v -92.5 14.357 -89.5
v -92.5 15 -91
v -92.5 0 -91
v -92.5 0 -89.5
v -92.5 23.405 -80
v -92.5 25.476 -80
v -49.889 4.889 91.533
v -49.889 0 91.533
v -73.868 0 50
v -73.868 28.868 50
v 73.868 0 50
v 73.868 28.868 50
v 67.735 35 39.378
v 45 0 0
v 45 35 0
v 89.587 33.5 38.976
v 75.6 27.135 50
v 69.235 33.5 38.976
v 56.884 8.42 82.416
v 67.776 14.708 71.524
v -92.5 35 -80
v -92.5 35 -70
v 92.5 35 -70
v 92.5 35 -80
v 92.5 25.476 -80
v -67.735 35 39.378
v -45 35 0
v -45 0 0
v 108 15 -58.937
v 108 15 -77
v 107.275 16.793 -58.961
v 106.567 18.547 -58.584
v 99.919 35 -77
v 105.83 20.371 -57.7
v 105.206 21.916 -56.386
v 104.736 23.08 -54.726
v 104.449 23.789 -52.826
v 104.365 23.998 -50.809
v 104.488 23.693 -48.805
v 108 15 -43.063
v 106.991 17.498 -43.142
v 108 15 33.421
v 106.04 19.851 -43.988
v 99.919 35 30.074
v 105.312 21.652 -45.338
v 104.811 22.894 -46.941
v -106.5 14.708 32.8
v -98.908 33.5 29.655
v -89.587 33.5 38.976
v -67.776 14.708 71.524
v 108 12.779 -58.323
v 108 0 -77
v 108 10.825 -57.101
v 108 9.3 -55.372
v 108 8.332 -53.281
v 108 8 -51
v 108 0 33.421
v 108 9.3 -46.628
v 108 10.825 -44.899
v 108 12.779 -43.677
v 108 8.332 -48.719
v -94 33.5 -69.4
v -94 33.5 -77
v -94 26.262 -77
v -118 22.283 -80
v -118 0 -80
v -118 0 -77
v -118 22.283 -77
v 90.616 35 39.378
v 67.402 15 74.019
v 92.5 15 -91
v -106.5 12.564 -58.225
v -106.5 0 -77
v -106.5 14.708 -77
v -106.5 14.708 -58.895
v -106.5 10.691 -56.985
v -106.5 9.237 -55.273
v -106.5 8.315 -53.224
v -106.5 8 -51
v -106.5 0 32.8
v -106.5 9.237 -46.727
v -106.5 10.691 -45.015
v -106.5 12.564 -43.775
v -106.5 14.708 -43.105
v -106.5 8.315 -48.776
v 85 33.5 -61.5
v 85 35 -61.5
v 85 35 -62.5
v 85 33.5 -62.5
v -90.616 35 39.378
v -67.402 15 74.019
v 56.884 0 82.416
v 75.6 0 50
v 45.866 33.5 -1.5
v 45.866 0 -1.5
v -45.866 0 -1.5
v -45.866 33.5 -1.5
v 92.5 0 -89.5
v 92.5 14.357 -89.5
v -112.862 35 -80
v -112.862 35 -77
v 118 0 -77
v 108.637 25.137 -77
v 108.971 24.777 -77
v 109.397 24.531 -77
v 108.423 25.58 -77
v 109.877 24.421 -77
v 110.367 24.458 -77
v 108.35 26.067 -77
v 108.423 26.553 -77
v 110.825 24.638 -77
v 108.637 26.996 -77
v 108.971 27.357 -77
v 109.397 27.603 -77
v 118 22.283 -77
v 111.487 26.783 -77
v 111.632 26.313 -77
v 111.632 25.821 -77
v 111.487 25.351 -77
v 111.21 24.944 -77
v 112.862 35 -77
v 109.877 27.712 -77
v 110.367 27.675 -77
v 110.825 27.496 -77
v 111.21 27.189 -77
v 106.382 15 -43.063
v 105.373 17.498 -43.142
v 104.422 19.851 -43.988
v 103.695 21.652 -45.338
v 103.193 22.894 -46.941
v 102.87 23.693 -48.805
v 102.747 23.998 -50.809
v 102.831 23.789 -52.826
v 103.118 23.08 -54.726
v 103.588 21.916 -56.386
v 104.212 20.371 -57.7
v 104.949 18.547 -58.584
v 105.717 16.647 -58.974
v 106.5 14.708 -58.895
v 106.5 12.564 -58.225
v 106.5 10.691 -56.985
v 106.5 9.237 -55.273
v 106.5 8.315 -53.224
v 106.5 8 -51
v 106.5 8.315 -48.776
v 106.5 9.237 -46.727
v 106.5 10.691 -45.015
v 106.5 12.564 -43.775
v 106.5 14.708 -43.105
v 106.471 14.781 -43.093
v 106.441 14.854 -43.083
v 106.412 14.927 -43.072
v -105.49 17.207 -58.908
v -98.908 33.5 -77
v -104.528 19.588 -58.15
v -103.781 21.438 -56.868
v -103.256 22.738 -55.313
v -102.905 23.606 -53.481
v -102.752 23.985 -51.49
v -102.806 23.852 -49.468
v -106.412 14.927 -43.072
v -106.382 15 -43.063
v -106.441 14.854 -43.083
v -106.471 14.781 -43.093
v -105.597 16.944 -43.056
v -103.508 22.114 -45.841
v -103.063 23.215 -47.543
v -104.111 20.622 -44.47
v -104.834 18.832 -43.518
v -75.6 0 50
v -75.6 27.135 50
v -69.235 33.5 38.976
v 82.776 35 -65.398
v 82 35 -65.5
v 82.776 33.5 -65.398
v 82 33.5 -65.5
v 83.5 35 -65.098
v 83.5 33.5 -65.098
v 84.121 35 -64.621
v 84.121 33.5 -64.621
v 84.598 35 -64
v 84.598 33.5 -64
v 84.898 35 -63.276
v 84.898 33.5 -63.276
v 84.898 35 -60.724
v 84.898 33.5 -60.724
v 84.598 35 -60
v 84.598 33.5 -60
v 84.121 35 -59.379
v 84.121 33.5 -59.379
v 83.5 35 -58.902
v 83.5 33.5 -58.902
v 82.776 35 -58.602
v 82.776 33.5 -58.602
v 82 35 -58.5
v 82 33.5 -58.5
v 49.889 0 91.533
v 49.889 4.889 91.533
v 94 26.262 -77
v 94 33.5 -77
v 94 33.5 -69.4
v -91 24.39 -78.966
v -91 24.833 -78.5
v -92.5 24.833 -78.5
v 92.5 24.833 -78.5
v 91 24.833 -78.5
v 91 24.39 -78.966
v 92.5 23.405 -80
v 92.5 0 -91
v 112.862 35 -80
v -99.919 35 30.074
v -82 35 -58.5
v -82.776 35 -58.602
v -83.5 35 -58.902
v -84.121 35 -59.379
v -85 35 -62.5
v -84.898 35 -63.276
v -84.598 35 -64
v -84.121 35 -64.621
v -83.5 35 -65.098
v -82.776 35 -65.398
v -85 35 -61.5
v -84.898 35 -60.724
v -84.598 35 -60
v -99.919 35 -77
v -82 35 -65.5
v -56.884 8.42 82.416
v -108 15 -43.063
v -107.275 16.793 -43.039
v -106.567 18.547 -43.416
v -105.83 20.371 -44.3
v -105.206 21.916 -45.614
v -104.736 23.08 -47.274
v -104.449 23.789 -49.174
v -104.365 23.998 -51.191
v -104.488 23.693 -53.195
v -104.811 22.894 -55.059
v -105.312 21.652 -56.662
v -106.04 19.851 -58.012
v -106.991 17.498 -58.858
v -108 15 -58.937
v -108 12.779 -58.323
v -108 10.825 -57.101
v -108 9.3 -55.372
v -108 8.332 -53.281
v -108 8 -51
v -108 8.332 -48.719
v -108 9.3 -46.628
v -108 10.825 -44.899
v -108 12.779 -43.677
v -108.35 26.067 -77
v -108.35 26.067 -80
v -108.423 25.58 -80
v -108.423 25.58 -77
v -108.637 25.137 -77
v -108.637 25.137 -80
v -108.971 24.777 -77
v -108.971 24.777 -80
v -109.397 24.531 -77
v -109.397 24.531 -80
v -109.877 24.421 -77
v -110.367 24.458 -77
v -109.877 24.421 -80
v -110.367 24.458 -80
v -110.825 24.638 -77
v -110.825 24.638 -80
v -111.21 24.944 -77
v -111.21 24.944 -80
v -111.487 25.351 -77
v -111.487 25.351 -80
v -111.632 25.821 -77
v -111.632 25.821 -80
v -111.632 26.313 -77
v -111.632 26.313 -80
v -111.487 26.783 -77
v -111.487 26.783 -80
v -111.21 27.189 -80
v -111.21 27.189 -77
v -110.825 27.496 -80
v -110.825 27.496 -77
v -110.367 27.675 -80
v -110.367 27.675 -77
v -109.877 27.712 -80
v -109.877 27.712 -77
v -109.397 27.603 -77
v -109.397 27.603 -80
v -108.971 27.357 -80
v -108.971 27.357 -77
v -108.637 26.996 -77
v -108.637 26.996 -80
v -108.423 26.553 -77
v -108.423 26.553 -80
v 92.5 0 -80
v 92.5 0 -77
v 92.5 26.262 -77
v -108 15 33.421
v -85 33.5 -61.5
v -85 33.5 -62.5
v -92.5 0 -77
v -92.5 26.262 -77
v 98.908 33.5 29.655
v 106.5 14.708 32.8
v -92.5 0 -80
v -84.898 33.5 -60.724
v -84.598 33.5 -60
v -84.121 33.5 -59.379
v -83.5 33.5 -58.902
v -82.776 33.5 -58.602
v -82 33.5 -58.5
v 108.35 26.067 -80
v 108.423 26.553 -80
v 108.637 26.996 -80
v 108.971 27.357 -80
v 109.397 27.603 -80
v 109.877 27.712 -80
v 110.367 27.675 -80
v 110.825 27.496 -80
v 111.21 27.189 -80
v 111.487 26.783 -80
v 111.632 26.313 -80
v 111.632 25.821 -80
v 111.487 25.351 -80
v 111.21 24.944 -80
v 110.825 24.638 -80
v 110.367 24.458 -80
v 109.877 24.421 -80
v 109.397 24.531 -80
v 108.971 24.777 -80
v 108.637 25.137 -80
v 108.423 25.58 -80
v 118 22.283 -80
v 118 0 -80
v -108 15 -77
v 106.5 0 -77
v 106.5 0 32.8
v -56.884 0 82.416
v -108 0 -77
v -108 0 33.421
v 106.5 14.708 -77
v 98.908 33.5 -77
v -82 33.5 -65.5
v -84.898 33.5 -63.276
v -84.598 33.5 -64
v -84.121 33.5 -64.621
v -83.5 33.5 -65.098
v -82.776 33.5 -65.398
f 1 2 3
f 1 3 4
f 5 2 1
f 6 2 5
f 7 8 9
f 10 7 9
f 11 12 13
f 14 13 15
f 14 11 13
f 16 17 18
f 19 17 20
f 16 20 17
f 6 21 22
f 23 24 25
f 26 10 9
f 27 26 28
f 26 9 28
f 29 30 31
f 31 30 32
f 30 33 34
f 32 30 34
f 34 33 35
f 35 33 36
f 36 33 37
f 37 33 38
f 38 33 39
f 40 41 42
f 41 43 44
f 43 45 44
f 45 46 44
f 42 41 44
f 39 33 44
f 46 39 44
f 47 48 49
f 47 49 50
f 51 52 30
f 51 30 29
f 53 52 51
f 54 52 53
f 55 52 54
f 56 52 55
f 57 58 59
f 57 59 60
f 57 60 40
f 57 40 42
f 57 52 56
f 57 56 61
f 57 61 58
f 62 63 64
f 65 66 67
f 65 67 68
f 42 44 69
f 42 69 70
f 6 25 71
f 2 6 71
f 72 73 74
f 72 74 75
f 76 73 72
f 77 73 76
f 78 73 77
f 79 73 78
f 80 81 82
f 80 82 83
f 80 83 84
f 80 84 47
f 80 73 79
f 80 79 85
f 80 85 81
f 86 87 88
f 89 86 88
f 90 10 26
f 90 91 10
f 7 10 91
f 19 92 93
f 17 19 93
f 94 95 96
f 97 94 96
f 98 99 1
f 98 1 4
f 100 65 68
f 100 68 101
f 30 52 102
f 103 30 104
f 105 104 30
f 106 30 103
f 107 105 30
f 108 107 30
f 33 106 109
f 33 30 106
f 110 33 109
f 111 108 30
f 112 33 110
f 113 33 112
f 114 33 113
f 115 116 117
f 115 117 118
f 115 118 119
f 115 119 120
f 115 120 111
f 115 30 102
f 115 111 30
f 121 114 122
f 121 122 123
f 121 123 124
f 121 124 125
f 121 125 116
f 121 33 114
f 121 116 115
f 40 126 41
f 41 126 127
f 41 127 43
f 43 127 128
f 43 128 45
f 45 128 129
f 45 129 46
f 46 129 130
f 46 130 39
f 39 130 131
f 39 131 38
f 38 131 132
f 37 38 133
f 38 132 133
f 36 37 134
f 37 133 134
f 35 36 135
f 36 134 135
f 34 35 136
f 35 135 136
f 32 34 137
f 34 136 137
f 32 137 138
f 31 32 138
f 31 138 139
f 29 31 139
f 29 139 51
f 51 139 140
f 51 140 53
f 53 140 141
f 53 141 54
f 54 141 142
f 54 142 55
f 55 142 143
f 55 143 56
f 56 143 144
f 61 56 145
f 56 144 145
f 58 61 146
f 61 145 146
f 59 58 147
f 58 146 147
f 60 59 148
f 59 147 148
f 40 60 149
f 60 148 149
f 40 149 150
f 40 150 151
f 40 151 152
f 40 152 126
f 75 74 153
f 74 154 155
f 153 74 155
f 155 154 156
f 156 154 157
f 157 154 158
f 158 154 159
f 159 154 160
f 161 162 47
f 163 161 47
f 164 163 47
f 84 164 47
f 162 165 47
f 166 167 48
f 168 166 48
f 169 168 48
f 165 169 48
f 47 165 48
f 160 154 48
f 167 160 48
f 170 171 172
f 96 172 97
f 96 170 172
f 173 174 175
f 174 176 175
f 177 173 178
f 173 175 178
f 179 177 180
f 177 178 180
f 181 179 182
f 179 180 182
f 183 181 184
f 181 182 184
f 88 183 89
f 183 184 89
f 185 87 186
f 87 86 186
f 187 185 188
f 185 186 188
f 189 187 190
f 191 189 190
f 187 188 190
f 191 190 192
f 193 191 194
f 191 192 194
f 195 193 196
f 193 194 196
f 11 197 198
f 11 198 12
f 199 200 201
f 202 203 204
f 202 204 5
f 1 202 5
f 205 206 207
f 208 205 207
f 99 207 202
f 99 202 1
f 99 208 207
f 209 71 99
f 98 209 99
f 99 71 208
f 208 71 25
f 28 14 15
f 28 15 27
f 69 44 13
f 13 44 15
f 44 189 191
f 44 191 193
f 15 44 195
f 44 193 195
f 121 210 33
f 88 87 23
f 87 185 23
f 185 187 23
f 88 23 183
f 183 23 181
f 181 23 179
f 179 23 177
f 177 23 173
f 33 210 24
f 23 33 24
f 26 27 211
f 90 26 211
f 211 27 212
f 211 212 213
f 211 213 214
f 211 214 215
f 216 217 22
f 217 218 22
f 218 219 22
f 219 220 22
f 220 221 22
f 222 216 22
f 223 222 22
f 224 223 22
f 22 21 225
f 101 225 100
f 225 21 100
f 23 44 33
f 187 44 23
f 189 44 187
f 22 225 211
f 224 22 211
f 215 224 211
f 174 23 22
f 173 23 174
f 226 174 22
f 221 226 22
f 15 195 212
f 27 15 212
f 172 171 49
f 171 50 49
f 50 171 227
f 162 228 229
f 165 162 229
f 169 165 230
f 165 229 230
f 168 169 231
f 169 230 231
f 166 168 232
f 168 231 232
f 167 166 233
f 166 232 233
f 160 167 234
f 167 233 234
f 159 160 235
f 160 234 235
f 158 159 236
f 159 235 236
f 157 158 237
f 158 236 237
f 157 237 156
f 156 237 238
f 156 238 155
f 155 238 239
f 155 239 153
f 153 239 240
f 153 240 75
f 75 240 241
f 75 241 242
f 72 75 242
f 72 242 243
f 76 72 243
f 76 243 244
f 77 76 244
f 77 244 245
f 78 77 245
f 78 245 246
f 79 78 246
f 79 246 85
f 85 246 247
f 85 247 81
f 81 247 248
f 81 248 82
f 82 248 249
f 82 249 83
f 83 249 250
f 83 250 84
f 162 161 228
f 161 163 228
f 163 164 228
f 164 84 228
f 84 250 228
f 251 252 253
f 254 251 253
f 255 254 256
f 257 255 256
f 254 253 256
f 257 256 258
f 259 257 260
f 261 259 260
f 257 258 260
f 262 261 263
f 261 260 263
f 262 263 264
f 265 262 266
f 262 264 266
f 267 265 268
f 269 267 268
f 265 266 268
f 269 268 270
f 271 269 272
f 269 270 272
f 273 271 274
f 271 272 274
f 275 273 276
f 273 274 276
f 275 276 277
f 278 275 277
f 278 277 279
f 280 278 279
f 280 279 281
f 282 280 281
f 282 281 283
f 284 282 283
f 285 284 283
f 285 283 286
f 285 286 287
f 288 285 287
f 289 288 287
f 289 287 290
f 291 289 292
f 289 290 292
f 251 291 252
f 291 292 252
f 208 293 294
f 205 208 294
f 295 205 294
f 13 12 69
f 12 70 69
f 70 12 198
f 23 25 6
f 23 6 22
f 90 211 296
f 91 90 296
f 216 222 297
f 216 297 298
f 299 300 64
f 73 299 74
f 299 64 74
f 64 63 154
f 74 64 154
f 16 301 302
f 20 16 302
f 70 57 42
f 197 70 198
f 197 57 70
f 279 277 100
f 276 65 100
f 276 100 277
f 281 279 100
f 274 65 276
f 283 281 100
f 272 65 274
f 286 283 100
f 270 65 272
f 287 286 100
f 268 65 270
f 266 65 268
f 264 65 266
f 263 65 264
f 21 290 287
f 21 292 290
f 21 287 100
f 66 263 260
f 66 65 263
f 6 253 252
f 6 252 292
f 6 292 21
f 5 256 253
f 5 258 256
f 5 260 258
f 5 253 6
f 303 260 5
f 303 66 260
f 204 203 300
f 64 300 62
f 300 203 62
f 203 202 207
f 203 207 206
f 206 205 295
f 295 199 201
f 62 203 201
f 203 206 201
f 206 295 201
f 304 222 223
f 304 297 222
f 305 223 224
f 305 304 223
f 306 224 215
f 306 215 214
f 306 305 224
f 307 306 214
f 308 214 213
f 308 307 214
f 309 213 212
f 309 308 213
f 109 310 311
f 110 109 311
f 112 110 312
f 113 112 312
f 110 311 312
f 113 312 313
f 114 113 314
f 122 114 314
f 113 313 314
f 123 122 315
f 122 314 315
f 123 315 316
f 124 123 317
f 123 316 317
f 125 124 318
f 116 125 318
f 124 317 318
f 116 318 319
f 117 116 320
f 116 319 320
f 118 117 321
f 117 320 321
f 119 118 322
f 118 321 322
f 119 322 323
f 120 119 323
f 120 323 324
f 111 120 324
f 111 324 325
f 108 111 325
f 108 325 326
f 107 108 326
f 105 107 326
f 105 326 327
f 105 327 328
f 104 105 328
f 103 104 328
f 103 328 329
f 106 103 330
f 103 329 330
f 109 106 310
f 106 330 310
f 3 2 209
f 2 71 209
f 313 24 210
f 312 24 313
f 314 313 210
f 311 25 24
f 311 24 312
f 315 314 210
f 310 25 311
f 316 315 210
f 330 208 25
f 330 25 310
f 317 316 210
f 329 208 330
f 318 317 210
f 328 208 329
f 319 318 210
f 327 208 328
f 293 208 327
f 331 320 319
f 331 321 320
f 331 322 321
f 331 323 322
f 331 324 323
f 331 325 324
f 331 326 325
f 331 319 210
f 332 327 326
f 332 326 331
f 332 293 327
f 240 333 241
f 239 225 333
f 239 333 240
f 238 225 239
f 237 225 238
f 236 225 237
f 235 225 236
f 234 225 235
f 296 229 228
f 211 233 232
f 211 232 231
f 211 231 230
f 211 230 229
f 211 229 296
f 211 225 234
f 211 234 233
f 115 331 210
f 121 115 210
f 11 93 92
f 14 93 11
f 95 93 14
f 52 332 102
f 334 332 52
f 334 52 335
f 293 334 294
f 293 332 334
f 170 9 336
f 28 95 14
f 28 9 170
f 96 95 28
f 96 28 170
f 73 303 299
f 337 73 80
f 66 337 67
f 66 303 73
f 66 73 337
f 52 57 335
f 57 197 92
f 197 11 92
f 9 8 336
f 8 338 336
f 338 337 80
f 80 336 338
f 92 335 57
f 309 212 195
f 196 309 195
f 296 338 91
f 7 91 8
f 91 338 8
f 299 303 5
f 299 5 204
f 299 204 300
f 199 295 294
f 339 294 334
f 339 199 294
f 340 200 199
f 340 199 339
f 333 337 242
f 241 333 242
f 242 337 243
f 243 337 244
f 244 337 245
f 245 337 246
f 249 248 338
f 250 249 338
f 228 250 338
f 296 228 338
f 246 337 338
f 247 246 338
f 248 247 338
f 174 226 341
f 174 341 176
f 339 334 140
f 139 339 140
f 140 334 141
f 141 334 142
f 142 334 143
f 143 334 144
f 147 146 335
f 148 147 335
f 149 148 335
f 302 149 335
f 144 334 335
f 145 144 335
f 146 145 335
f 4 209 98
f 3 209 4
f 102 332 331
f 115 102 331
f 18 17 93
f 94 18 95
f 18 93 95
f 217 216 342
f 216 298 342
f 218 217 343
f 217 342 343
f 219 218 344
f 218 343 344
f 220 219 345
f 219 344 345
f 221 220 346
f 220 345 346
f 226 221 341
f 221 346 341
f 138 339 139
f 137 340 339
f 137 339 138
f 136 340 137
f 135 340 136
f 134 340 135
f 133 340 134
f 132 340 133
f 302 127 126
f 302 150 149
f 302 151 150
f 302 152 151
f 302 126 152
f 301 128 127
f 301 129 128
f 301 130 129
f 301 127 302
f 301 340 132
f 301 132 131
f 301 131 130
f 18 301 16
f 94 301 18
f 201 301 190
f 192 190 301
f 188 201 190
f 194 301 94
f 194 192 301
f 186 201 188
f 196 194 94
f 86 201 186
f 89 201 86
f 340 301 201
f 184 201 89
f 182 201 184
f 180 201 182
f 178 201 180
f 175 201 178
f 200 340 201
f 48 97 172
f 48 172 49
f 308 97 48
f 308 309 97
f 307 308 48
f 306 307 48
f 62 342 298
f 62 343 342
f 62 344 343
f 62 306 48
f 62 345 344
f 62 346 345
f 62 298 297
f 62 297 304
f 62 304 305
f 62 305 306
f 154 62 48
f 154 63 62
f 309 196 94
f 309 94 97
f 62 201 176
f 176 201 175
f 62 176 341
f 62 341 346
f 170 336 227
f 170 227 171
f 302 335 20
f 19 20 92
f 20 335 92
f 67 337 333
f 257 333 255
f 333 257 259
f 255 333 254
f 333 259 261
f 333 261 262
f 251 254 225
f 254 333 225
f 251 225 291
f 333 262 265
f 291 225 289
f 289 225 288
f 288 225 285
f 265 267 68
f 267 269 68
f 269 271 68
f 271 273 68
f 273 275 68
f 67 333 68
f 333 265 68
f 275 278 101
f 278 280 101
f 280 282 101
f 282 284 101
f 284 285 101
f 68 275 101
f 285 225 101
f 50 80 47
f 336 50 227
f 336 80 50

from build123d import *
from OCP.BRepFilletAPI import BRepFilletAPI_MakeChamfer

# Parameters (mm, degrees)
BOSS_EXTRU_1_DEPTH           = 35
ENL_V_MAT_EXTRU_1_DEPTH      = 146.832988115
ENL_V_MAT_EXTRU_1_DEPTH_BACK = 146.832988115
CHANFREIN2_SIZE              = 20
CHANFREIN2_SIZE2             = 8.080524517
BOSS_EXTRU_2_DEPTH           = 92.5
ENL_V_MAT_EXTRU_2_DEPTH      = 185
COQUE1_T                     = -1.5
ESQUISSE5_R                  = 8
ENL_V_MAT_EXTRU_3_DEPTH      = 238.190346394
ESQUISSE6_W                  = 170
ESQUISSE6_H                  = 7
ENL_V_MAT_EXTRU_4_DEPTH      = 146.832988115
CONG_1_R                     = 3
ESQUISSE7_R                  = 1.65
BOSS_EXTRU_3_DEPTH           = 3
ENL_V_MAT_EXTRU_5_DEPTH      = 185


with BuildPart() as part:
    # Esquisse1 → Boss.-Extru.1 (new body)
    with BuildSketch(Plane(origin=(0, 0, 0), x_dir=(1, 0, 0), z_dir=(0, 1, 0))):
        Polygon((-108, -33.421356237), (-49.888518291, -91.532837946), (-73.867513459, -50), (-45, 0), (0, 0), (0, 80), (-108, 80), align=None)
    extrude(amount=BOSS_EXTRU_1_DEPTH)

    # Esquisse2 → Enlèv. mat.-Extru.1 (cut, two sides: drawn at the far end of the back side and taken through both)
    with BuildSketch(Plane(origin=(0, 0, 0), x_dir=(0, 0, -1), z_dir=(1, 0, 0)).offset(-ENL_V_MAT_EXTRU_1_DEPTH_BACK)):
        Polygon((-91.532837946, 35), (-91.532837946, 4.888518291), (-39.378221735, 35), align=None)
    extrude(amount=ENL_V_MAT_EXTRU_1_DEPTH + ENL_V_MAT_EXTRU_1_DEPTH_BACK, mode=Mode.SUBTRACT)

    # Chanfrein2: one chamfer whose edges measure the first distance from different faces: ONE call of the kernel's chamfer builder (chamfer() names one face for all edges)
    chanfrein2_edges_1 = [part.edges().sort_by_distance(p)[0] for p in [
        (-108, 35, -23.289321881),
    ]]
    chanfrein2_side_1 = [part.faces().sort_by_distance(p)[0] for p in [
        (-108, 17.5, -23.289321881),
    ]]
    chanfrein2_edges_2 = [part.edges().sort_by_distance(p)[0] for p in [
        (-105.021567251, 35, 36.399788986),
    ]]
    chanfrein2_side_2 = [part.faces().sort_by_distance(p)[0] for p in [
        (-86.283455205, 12.807012464, 55.137901032),
    ]]
    chanfrein2 = BRepFilletAPI_MakeChamfer(part.part.solid().wrapped)
    for e in chanfrein2_edges_1:
        chanfrein2.Add(CHANFREIN2_SIZE, CHANFREIN2_SIZE2, e.wrapped, chanfrein2_side_1[0].wrapped)  # the first distance lies on this face
    for e in chanfrein2_edges_2:
        chanfrein2.Add(CHANFREIN2_SIZE, CHANFREIN2_SIZE2, e.wrapped, chanfrein2_side_2[0].wrapped)  # the first distance lies on this face
    add(Compound.cast(chanfrein2.Shape()), mode=Mode.REPLACE)

    # Symétrie1: part across plane


with BuildPart() as part_1:
    add(part.part)
    add(part.part.mirror(Plane(origin=(0, 35, -80), x_dir=(0, 0, 1), z_dir=(-1, 0, 0))))

    # Esquisse3 → Boss.-Extru.2 (add, symmetric)
    with BuildSketch(Plane(origin=(0, 0, 0), x_dir=(0, 0, -1), z_dir=(1, 0, 0))):
        Polygon((80, 25.476190476), (91, 15), (91, 0), (80, 0), align=None)
    extrude(amount=BOSS_EXTRU_2_DEPTH, both=True)

    # Esquisse4 → Enlèv. mat.-Extru.2 (cut)
    with BuildSketch(Plane(origin=(92.5, 0, 0), x_dir=(0, 0, -1), z_dir=(1, 0, 0))):
        Polygon((91, 15), (70, 35), (91, 35), align=None)
    extrude(amount=-ENL_V_MAT_EXTRU_2_DEPTH, mode=Mode.SUBTRACT)

    # Coque1
    coque1_openings = [part_1.faces().sort_by_distance(p)[0] for p in [
        (0, 0, -29.297783108),
    ]]
    offset(amount=COQUE1_T, openings=coque1_openings, kind=Kind.INTERSECTION)

    # Esquisse5 → Enlèv. mat.-Extru.3 (cut, through all)
    with BuildSketch(Plane.ZY.offset(108)):
        with Locations(Location((-51, 16, 0), (0, 0, 352.819244219))):
            Circle(ESQUISSE5_R)
    extrude(amount=-ENL_V_MAT_EXTRU_3_DEPTH, mode=Mode.SUBTRACT)

    # Esquisse6 → Enlèv. mat.-Extru.4 (cut, through all)
    with BuildSketch(Plane(origin=(0, 35, 0), x_dir=(1, 0, 0), z_dir=(0, 1, 0))):
        with Locations((0, 62)):
            Rectangle(ESQUISSE6_W, ESQUISSE6_H)
    extrude(amount=-ENL_V_MAT_EXTRU_4_DEPTH, mode=Mode.SUBTRACT)

    # Congé1
    cong_1_edges = [part_1.edges().sort_by_distance(p)[0] for p in [
        (85, 34.25, -65.5),
        (85, 34.25, -58.5),
        (-85, 34.25, -58.5),
        (-85, 34.25, -65.5),
    ]]
    fillet(cong_1_edges, radius=CONG_1_R)

    # Esquisse7 → Boss.-Extru.3 (add)
    # profile 1 of 2: a face of its own
    with BuildSketch(Plane(origin=(0, 0, -80), x_dir=(-1, 0, 0), z_dir=(0, 0, -1))):
        Polygon((-92.5, 0), (-118, 0), (-118, 22.282737416), (-112.861892395, 35), (-92.5, 35), align=None)
        with Locations((-110, 26.066629268)):
            Circle(ESQUISSE7_R, mode=Mode.SUBTRACT)
    # profile 2 of 2: a face of its own
    with BuildSketch(Plane(origin=(0, 0, -80), x_dir=(-1, 0, 0), z_dir=(0, 0, -1))):
        Polygon((92.5, 0), (118, 0), (118, 22.282737416), (112.861892395, 35), (92.5, 35), align=None)
        with Locations(Location((110, 26.066629268, 0), (0, 0, 180))):
            Circle(ESQUISSE7_R, mode=Mode.SUBTRACT)
    extrude(amount=-BOSS_EXTRU_3_DEPTH)

    # Esquisse8 → Enlèv. mat.-Extru.5 (cut)
    with BuildSketch(Plane.ZY.offset(-92.5)):
        Polygon((-78.5, 0), (-78.5, 24.833333333), (-89.5, 14.357142857), (-89.5, 0), align=None)
    extrude(amount=ENL_V_MAT_EXTRU_5_DEPTH, mode=Mode.SUBTRACT)


solid = part_1.part
